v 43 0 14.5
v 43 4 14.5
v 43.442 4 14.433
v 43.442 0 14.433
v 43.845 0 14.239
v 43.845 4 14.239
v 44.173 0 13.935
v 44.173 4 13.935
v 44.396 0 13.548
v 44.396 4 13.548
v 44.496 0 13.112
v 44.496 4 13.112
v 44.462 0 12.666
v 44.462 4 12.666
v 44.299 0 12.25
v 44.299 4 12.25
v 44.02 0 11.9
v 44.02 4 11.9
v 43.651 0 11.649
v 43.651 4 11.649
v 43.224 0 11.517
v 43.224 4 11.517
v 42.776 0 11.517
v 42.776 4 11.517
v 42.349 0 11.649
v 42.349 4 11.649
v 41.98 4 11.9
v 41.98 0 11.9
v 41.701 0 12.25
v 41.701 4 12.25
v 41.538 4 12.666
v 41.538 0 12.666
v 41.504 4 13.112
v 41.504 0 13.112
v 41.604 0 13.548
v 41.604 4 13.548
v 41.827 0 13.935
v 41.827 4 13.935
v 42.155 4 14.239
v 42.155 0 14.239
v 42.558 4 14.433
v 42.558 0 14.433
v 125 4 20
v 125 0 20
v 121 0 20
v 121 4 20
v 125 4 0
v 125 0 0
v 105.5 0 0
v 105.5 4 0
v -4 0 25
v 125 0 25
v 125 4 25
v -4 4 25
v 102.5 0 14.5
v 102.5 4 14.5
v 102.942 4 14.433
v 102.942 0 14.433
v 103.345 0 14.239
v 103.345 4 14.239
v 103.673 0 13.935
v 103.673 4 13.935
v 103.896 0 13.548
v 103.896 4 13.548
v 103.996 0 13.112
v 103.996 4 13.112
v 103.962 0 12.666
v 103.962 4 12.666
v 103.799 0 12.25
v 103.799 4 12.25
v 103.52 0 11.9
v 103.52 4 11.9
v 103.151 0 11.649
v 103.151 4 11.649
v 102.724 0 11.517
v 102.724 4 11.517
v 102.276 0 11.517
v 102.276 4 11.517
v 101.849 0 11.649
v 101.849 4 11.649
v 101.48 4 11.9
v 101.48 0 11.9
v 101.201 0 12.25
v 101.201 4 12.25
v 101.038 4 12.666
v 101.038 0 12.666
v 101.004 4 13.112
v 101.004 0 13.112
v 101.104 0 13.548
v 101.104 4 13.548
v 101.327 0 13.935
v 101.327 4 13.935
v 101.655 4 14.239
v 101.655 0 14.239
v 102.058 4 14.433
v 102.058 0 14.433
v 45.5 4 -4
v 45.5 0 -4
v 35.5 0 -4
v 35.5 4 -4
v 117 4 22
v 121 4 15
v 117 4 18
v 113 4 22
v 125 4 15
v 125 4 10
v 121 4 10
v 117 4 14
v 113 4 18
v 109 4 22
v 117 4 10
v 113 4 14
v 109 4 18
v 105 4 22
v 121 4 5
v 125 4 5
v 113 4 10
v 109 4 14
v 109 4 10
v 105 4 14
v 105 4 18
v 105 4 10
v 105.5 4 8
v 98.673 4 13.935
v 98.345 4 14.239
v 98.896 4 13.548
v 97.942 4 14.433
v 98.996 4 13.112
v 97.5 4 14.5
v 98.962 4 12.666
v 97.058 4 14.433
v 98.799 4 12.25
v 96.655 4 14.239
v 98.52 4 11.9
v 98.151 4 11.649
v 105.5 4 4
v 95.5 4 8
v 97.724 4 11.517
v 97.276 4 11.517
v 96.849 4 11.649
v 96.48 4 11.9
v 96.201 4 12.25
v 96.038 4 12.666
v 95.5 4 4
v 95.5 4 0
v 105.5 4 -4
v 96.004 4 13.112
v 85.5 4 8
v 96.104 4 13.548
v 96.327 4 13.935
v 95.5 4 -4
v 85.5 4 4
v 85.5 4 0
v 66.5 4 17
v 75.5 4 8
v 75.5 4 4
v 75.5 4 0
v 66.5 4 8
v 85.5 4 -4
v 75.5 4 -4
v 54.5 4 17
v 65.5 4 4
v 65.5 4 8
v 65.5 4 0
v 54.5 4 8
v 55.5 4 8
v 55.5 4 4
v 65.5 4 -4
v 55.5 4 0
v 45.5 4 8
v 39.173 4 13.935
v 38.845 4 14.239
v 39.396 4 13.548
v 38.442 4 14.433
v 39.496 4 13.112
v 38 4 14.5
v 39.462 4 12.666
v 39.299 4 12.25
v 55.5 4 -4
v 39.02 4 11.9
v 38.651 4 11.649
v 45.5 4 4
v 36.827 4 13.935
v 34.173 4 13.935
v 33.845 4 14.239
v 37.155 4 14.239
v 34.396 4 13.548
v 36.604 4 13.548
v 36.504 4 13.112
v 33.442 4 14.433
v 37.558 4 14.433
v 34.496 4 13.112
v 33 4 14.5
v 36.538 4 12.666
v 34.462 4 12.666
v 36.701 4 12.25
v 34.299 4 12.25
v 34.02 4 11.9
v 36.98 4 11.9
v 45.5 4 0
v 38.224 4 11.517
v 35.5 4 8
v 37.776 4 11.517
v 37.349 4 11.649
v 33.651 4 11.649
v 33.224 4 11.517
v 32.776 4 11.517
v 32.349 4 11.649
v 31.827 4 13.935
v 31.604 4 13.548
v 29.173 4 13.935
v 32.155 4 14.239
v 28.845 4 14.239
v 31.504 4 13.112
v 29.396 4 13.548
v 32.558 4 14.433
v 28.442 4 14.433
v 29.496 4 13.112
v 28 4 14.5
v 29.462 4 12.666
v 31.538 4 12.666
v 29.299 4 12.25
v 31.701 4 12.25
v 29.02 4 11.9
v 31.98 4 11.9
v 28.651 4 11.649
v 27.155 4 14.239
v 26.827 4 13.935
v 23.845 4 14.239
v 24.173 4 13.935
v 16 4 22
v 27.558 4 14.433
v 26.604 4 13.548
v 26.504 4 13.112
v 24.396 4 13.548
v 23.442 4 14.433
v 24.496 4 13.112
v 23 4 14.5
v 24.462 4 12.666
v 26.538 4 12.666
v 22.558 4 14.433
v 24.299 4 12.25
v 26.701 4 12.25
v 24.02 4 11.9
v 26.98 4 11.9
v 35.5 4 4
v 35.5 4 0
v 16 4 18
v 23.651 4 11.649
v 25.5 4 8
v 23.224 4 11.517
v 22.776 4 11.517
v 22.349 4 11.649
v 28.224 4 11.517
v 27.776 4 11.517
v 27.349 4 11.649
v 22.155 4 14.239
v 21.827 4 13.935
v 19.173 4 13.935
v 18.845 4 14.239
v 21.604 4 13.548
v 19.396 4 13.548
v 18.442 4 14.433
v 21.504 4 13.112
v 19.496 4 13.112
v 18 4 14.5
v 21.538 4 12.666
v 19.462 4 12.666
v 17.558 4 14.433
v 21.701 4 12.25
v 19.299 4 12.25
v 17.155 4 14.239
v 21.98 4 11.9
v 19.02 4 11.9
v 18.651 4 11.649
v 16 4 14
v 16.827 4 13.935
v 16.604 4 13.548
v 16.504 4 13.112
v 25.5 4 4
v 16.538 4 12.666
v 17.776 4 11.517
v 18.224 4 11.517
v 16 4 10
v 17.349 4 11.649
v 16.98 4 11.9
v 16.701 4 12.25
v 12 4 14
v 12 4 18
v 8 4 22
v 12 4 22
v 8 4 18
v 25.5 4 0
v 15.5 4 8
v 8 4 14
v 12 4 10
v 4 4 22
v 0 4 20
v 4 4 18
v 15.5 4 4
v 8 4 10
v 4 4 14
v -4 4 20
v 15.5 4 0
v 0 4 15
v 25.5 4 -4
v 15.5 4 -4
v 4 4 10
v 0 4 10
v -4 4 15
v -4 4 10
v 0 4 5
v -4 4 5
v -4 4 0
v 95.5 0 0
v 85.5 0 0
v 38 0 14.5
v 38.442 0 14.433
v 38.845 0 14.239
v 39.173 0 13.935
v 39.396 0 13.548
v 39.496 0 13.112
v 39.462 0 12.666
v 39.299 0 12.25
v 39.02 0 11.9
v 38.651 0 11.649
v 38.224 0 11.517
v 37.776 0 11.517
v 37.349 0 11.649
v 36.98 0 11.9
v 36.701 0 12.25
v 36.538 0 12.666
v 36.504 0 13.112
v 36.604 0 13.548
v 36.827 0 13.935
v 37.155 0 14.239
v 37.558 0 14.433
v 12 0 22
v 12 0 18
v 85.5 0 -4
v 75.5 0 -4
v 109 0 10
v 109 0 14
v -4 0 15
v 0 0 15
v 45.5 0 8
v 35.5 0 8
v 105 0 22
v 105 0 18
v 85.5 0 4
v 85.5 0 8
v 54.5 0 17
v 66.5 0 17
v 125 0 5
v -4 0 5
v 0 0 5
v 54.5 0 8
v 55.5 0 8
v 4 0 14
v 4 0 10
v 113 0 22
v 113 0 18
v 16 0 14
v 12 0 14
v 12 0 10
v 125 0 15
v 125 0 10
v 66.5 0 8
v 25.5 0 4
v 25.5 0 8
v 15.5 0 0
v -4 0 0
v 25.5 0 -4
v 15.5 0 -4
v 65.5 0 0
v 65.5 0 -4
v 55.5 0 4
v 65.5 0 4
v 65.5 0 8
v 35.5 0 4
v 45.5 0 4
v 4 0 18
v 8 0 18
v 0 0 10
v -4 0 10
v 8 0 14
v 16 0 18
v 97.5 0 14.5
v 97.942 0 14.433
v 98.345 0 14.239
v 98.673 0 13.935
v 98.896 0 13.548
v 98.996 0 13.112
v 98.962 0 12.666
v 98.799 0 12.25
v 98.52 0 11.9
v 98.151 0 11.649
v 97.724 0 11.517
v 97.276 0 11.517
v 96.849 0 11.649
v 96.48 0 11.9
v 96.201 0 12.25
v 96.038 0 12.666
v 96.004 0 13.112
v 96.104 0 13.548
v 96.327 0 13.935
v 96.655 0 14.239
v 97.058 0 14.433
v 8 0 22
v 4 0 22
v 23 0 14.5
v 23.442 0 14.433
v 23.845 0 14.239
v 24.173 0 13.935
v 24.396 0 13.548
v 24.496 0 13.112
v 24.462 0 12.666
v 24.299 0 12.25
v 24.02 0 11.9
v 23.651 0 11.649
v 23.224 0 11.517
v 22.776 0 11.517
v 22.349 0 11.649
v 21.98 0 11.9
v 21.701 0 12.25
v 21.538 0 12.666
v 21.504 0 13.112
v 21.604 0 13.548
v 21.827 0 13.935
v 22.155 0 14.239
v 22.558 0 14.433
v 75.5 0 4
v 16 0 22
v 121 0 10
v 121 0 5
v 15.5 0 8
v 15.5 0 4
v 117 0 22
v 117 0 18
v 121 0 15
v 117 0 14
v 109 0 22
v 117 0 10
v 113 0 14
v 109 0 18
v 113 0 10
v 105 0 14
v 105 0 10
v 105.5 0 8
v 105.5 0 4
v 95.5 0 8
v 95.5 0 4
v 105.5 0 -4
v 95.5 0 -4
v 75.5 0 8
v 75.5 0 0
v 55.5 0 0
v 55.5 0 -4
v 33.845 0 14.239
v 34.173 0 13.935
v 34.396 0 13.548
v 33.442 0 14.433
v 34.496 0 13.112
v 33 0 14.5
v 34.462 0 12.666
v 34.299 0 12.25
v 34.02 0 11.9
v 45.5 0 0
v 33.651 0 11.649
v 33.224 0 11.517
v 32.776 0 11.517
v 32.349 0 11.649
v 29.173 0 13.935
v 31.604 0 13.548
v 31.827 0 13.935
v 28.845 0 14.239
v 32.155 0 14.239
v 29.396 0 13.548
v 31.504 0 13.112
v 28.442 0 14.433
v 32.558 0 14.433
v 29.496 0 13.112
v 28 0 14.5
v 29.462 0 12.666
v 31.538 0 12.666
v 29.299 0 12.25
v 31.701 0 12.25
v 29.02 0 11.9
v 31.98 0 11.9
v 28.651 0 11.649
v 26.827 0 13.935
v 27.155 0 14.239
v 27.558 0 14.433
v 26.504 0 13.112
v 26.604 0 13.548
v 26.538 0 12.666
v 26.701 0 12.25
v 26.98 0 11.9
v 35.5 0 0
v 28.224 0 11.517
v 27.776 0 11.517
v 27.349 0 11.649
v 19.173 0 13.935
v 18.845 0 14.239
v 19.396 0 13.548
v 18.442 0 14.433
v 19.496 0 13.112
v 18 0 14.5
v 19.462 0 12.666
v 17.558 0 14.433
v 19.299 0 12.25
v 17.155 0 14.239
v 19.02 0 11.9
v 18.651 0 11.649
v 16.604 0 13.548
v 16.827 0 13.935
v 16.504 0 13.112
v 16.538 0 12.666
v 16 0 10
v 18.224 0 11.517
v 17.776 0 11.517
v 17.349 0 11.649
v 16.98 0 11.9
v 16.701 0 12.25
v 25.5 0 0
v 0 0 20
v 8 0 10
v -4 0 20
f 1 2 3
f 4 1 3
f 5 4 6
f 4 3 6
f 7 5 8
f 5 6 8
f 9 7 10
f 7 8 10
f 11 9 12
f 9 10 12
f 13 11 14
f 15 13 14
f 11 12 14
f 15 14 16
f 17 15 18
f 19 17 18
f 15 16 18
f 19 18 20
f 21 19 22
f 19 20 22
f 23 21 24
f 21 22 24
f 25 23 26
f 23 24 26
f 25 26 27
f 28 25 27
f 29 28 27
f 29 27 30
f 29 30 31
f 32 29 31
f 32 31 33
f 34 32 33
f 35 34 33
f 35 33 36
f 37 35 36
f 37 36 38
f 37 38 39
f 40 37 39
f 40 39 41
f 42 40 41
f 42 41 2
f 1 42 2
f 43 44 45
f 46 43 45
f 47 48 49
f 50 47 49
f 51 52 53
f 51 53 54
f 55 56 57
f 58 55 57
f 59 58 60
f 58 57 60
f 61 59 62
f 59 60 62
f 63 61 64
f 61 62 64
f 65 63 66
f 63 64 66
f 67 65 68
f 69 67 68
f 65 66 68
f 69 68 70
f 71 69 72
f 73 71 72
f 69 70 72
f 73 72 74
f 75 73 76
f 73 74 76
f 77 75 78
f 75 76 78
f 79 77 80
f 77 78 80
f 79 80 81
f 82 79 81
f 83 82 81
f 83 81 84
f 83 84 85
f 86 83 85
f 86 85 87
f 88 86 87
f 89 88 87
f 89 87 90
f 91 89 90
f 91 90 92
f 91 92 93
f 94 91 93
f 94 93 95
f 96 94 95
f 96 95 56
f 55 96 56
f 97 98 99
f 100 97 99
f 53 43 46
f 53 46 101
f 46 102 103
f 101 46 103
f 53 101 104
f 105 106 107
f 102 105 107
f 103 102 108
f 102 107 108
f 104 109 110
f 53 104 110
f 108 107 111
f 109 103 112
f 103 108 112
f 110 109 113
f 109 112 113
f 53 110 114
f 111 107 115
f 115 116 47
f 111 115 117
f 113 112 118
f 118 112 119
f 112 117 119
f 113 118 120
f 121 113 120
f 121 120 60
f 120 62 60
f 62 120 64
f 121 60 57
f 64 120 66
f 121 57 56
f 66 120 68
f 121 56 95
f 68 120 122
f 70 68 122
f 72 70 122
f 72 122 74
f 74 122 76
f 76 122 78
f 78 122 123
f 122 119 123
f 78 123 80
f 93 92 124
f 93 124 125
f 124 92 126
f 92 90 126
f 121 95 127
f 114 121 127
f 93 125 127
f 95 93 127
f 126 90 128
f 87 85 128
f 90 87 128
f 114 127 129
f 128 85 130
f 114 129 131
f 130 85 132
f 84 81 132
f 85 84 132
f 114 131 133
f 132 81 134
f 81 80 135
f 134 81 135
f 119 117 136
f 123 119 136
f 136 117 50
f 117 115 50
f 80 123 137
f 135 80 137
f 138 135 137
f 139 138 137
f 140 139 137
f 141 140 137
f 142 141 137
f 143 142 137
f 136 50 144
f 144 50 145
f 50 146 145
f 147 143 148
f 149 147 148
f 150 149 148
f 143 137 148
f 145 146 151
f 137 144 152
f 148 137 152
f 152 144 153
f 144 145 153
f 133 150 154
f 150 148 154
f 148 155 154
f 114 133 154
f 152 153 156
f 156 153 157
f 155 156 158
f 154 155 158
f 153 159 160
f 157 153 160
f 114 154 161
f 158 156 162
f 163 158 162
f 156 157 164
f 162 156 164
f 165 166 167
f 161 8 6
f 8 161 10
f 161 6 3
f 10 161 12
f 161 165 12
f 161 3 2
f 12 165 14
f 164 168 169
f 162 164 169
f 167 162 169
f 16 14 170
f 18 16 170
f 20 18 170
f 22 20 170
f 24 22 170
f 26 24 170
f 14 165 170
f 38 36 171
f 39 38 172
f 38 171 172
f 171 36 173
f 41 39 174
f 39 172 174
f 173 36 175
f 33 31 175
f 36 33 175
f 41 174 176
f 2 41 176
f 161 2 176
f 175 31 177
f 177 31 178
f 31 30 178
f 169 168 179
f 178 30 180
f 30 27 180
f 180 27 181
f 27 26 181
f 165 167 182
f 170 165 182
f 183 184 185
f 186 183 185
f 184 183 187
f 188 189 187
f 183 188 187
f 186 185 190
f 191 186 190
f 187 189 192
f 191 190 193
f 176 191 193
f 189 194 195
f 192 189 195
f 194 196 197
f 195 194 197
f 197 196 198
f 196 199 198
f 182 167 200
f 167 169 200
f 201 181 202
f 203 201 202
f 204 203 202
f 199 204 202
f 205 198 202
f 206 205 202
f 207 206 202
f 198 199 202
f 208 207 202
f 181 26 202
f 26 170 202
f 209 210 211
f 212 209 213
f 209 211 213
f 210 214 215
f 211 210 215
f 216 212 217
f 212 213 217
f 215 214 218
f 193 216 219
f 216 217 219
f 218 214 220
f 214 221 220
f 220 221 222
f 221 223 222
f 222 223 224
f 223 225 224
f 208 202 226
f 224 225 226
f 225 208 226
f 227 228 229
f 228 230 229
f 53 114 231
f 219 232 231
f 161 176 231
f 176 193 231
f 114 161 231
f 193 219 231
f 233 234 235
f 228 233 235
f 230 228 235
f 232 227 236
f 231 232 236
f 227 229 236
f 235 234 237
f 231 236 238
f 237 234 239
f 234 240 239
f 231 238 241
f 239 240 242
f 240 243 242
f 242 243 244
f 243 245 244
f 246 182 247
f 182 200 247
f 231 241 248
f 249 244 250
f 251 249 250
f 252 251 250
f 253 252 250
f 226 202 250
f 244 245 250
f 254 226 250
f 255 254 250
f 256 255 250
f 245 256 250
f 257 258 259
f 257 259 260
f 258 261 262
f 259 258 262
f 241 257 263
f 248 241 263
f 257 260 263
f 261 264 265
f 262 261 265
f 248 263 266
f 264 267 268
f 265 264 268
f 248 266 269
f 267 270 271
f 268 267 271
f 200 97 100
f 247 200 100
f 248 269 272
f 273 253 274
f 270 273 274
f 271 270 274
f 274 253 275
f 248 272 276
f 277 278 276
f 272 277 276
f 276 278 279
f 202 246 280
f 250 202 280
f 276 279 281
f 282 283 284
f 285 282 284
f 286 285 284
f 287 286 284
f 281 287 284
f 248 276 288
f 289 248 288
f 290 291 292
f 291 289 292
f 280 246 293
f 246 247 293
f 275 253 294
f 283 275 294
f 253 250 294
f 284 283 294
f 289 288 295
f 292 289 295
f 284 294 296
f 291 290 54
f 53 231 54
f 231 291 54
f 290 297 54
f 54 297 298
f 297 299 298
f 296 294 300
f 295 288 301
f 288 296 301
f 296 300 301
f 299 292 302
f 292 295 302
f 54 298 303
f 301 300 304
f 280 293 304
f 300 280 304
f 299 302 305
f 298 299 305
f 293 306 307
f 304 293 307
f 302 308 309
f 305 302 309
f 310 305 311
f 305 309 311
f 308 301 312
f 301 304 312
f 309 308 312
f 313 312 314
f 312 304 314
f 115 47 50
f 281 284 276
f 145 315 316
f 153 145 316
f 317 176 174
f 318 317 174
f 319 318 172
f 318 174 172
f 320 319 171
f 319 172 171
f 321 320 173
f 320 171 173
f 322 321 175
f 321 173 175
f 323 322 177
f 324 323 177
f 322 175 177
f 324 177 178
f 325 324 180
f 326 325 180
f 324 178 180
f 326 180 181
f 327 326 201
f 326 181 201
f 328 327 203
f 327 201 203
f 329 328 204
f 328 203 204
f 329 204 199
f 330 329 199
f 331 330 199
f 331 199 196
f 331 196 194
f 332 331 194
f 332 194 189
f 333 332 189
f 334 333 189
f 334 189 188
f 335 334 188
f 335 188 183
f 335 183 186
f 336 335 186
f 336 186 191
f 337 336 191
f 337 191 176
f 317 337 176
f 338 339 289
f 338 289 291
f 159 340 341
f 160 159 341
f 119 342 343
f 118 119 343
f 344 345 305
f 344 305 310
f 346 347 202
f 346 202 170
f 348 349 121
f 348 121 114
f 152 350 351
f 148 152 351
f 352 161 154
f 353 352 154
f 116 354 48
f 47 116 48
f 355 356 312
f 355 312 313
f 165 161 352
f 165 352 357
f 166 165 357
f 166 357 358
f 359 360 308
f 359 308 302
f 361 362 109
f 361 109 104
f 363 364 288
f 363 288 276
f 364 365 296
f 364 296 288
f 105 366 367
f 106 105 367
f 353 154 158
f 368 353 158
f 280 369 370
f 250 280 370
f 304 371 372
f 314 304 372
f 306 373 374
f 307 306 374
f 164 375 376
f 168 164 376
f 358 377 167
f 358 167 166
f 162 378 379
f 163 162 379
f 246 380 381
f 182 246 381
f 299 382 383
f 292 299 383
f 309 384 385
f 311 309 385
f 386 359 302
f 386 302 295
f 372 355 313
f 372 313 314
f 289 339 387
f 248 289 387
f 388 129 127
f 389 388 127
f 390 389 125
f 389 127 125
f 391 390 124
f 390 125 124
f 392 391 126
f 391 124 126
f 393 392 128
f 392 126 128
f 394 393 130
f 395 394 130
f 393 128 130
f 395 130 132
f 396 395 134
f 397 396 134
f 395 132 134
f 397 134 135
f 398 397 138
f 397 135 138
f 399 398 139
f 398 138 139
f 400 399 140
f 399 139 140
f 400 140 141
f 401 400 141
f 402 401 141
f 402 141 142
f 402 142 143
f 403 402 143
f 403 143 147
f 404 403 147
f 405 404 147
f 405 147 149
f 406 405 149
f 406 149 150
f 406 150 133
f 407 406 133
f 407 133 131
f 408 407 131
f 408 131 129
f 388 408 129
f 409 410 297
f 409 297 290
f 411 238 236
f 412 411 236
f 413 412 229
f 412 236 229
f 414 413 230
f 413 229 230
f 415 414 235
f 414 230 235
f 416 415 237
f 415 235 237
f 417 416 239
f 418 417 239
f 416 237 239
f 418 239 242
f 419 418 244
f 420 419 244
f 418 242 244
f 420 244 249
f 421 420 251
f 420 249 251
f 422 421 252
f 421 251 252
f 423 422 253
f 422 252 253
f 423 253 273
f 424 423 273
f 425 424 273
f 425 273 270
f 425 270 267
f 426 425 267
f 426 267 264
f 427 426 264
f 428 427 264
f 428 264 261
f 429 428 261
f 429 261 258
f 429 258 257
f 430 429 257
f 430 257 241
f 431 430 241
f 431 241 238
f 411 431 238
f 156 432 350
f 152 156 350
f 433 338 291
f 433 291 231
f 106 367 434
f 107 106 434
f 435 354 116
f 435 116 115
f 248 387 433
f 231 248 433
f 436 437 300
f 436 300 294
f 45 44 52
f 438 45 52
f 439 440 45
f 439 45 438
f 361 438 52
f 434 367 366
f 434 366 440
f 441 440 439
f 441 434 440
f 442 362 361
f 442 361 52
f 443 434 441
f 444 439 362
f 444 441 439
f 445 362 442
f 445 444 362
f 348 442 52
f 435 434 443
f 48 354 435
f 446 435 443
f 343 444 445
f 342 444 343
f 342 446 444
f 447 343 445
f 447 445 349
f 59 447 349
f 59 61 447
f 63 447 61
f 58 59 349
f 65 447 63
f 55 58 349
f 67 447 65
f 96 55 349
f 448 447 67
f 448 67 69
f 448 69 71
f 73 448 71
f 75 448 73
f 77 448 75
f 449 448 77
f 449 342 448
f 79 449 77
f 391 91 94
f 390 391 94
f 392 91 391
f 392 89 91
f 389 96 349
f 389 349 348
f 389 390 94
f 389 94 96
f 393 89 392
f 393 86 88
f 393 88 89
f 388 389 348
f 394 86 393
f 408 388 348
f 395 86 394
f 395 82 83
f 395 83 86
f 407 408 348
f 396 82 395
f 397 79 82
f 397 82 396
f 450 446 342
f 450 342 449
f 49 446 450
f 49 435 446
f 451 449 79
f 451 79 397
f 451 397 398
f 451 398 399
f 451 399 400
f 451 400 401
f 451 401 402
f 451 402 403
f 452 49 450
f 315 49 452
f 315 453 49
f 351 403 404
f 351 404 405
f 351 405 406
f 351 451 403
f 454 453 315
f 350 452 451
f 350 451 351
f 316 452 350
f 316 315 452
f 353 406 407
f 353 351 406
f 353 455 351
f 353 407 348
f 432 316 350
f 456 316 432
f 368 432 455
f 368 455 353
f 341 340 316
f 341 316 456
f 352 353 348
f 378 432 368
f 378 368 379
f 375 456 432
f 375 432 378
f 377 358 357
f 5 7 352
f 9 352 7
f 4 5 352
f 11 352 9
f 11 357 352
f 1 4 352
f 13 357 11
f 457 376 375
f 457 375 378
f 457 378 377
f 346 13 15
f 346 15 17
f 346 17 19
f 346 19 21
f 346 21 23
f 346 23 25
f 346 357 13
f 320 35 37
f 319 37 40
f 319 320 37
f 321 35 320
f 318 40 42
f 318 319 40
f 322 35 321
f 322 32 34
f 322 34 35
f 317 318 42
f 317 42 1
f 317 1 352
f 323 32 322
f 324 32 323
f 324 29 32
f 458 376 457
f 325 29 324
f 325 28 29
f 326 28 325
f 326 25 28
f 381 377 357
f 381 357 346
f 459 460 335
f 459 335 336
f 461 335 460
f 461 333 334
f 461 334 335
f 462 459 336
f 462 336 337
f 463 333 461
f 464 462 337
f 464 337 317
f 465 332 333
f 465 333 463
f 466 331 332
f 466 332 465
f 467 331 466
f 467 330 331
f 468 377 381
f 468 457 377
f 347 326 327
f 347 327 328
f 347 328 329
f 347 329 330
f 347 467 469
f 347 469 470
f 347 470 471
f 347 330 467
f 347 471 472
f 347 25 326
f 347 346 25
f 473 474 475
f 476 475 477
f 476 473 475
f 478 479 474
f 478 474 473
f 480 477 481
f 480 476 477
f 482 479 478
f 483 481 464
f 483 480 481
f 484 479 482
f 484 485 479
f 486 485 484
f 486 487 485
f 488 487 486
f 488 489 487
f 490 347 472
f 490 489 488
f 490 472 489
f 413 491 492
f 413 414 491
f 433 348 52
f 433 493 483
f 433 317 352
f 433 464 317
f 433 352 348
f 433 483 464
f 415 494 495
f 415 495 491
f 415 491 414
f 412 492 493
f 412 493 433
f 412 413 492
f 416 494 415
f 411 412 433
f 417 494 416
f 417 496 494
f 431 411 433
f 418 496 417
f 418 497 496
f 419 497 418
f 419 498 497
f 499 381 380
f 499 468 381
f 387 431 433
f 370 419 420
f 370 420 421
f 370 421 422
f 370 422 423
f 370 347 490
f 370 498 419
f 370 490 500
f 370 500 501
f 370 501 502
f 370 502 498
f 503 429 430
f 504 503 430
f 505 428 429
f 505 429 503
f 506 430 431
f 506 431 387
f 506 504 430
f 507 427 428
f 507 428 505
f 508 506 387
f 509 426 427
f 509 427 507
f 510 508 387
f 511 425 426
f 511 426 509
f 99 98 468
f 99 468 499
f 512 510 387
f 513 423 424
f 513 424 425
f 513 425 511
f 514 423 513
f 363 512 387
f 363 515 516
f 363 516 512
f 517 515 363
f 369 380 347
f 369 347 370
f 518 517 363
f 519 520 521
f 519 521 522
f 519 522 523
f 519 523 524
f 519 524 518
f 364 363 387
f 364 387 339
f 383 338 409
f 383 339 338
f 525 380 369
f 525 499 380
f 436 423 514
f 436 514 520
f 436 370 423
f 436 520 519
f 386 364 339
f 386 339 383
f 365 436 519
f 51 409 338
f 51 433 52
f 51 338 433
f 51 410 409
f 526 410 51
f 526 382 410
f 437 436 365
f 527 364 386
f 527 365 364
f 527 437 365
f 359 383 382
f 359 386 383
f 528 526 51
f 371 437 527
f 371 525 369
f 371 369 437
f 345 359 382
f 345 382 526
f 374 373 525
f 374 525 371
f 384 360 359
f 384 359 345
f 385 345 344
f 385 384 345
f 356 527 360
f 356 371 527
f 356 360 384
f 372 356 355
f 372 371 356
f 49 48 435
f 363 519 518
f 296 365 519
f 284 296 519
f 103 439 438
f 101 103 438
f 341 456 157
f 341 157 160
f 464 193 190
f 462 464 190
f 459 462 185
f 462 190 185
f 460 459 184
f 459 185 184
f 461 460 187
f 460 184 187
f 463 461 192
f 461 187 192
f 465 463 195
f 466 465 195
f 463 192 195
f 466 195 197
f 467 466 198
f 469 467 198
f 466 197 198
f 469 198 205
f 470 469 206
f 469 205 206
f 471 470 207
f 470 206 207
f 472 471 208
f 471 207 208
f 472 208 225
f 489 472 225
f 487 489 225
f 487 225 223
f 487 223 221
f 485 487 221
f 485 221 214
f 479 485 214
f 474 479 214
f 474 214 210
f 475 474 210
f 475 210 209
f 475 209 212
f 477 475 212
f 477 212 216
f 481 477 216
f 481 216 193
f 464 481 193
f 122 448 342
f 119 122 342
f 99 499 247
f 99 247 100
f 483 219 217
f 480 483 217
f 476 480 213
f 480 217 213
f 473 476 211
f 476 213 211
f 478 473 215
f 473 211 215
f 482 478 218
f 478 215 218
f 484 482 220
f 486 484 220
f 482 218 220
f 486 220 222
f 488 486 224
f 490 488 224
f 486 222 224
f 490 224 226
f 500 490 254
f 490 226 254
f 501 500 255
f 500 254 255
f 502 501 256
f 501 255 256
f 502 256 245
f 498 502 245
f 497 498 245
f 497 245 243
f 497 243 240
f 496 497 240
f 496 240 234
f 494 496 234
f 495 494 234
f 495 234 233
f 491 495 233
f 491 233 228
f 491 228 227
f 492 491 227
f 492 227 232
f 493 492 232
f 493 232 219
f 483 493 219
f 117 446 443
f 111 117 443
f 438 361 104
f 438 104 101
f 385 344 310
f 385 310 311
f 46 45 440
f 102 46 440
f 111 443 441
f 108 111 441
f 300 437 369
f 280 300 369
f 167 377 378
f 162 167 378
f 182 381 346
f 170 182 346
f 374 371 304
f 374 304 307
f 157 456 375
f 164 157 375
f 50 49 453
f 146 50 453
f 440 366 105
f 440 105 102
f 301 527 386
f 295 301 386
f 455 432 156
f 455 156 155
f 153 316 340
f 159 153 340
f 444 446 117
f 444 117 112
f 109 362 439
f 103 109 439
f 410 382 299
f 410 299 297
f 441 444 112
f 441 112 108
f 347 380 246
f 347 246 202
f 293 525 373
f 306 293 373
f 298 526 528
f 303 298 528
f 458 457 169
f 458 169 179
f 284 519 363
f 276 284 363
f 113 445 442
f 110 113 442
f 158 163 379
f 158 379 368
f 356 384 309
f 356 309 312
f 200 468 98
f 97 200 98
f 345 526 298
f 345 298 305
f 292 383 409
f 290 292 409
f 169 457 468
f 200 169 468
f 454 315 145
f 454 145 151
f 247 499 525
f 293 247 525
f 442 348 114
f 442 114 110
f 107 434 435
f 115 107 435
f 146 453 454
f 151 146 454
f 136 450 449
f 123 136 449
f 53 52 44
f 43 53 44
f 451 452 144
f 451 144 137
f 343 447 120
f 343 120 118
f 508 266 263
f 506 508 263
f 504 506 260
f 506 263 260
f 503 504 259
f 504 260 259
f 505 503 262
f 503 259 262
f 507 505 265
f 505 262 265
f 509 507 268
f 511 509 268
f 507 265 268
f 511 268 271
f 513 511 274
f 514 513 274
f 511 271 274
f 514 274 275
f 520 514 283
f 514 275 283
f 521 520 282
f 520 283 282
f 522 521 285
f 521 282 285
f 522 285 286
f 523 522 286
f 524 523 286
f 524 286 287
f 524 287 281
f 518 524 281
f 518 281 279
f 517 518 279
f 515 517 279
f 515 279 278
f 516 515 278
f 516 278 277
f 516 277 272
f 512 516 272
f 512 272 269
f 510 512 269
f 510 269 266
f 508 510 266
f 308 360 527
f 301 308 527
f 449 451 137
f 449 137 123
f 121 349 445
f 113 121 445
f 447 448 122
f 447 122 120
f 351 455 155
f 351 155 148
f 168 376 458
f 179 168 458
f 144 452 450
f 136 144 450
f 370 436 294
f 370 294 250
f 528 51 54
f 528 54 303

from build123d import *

# Parameters (mm, degrees)
SKETCH1_W           = 121
SKETCH1_H           = 25
BOSS_EXTRUDE1_DEPTH = 4
SKETCH2_W           = 4
SKETCH2_H           = 5
BOSS_EXTRUDE2_DEPTH = 4
LPATTERN1_COUNT     = 3
LPATTERN1_PITCH     = 10
SKETCH3_W           = 10
SKETCH3_H           = 4
BOSS_EXTRUDE3_DEPTH = 4
LPATTERN2_COUNT     = 3
LPATTERN2_PITCH     = 20
LPATTERN2_COL_COUNT = 3
LPATTERN2_COL_PITCH = 20
SKETCH4_W           = 10
SKETCH4_H           = 4
CUT_EXTRUDE1_DEPTH  = 128.538229563
SKETCH5_R           = 1.5
SKETCH5_W           = 12
SKETCH5_H           = 9
CUT_EXTRUDE2_DEPTH  = 128.538229563
SKETCH7_W           = 4
SKETCH7_H           = 4
CUT_EXTRUDE4_DEPTH  = 128.538229563


with BuildPart() as part:
    # Sketch1 → Boss-Extrude1 (new body)
    with BuildSketch(Plane(origin=(0, 0, 0), x_dir=(1, 0, 0), z_dir=(0, 1, 0))):
        with Locations((60.5, -12.5)):
            Rectangle(SKETCH1_W, SKETCH1_H)
    extrude(amount=BOSS_EXTRUDE1_DEPTH)

    # Sketch2 → Boss-Extrude2 (add, through all)
    with BuildSketch(Plane(origin=(0, 0, 0), x_dir=(-1, 0, 0), z_dir=(0, -1, 0))):
        with Locations((2, -22.5)):
            Rectangle(SKETCH2_W, SKETCH2_H)
        with Locations((-123, -22.5)):
            Rectangle(SKETCH2_W, SKETCH2_H)
    boss_extrude2 = extrude(amount=-BOSS_EXTRUDE2_DEPTH)

    # LPattern1: Boss-Extrude2 ×3
    with Locations(*[(0, 0, -i * LPATTERN1_PITCH) for i in range(1, LPATTERN1_COUNT)]):
        add(boss_extrude2)

    # Sketch3 → Boss-Extrude3 (add, through all)
    with BuildSketch(Plane(origin=(0, 0, 0), x_dir=(-1, 0, 0), z_dir=(0, -1, 0))):
        with Locations((-60.5, 2)):
            Rectangle(SKETCH3_W, SKETCH3_H)
    boss_extrude3 = extrude(amount=-BOSS_EXTRUDE3_DEPTH)

    # LPattern2: Boss-Extrude3 ×3
    with Locations(*[(i * LPATTERN2_PITCH, 0, 0) for i in range(1, LPATTERN2_COUNT)]):
        add(boss_extrude3)

    # LPattern2 col: Boss-Extrude3 ×3
    with Locations(*[(-i * LPATTERN2_COL_PITCH, 0, 0) for i in range(1, LPATTERN2_COL_COUNT)]):
        add(boss_extrude3)

    # Sketch4 → Cut-Extrude1 (cut, through all)
    with BuildSketch(Plane.XZ):
        with Locations((20.5, 6)):
            Rectangle(SKETCH4_W, SKETCH4_H)
        with Locations((40.5, 6)):
            Rectangle(SKETCH4_W, SKETCH4_H)
        with Locations((60.5, 6)):
            Rectangle(SKETCH4_W, SKETCH4_H)
        with Locations((80.5, 6)):
            Rectangle(SKETCH4_W, SKETCH4_H)
        with Locations((100.5, 6)):
            Rectangle(SKETCH4_W, SKETCH4_H)
    extrude(amount=-CUT_EXTRUDE1_DEPTH, mode=Mode.SUBTRACT)

    # Sketch5 → Cut-Extrude2 (cut, through all)
    with BuildSketch(Plane(origin=(0, 4, 0), x_dir=(1, 0, 0), z_dir=(0, 1, 0))):
        with Locations(Location((97.5, -13, 0), (0, 0, 270))):
            Circle(SKETCH5_R)
        with Locations(Location((102.5, -13, 0), (0, 0, 270))):
            Circle(SKETCH5_R)
        with Locations(Location((43, -13, 0), (0, 0, 270))):
            Circle(SKETCH5_R)
        with Locations(Location((38, -13, 0), (0, 0, 270))):
            Circle(SKETCH5_R)
        with Locations(Location((33, -13, 0), (0, 0, 270))):
            Circle(SKETCH5_R)
        with Locations(Location((28, -13, 0), (0, 0, 270))):
            Circle(SKETCH5_R)
        with Locations(Location((23, -13, 0), (0, 0, 270))):
            Circle(SKETCH5_R)
        with Locations(Location((18, -13, 0), (0, 0, 270))):
            Circle(SKETCH5_R)
        with Locations((60.5, -12.5)):
            Rectangle(SKETCH5_W, SKETCH5_H)
    extrude(amount=-CUT_EXTRUDE2_DEPTH, mode=Mode.SUBTRACT)

    # Sketch7 → Cut-Extrude4 (cut, through all)
    with BuildSketch(Plane.XZ):
        with Locations((6, 20)):
            Rectangle(SKETCH7_W, SKETCH7_H)
        with Locations((14, 20)):
            Rectangle(SKETCH7_W, SKETCH7_H)
        with Locations((6, 12)):
            Rectangle(SKETCH7_W, SKETCH7_H)
        with Locations((14, 12)):
            Rectangle(SKETCH7_W, SKETCH7_H)
        with Locations((107, 20)):
            Rectangle(SKETCH7_W, SKETCH7_H)
        with Locations((107, 12)):
            Rectangle(SKETCH7_W, SKETCH7_H)
        with Locations((115, 20)):
            Rectangle(SKETCH7_W, SKETCH7_H)
        with Locations((115, 12)):
            Rectangle(SKETCH7_W, SKETCH7_H)
    extrude(amount=-CUT_EXTRUDE4_DEPTH, mode=Mode.SUBTRACT)


solid = part.part
